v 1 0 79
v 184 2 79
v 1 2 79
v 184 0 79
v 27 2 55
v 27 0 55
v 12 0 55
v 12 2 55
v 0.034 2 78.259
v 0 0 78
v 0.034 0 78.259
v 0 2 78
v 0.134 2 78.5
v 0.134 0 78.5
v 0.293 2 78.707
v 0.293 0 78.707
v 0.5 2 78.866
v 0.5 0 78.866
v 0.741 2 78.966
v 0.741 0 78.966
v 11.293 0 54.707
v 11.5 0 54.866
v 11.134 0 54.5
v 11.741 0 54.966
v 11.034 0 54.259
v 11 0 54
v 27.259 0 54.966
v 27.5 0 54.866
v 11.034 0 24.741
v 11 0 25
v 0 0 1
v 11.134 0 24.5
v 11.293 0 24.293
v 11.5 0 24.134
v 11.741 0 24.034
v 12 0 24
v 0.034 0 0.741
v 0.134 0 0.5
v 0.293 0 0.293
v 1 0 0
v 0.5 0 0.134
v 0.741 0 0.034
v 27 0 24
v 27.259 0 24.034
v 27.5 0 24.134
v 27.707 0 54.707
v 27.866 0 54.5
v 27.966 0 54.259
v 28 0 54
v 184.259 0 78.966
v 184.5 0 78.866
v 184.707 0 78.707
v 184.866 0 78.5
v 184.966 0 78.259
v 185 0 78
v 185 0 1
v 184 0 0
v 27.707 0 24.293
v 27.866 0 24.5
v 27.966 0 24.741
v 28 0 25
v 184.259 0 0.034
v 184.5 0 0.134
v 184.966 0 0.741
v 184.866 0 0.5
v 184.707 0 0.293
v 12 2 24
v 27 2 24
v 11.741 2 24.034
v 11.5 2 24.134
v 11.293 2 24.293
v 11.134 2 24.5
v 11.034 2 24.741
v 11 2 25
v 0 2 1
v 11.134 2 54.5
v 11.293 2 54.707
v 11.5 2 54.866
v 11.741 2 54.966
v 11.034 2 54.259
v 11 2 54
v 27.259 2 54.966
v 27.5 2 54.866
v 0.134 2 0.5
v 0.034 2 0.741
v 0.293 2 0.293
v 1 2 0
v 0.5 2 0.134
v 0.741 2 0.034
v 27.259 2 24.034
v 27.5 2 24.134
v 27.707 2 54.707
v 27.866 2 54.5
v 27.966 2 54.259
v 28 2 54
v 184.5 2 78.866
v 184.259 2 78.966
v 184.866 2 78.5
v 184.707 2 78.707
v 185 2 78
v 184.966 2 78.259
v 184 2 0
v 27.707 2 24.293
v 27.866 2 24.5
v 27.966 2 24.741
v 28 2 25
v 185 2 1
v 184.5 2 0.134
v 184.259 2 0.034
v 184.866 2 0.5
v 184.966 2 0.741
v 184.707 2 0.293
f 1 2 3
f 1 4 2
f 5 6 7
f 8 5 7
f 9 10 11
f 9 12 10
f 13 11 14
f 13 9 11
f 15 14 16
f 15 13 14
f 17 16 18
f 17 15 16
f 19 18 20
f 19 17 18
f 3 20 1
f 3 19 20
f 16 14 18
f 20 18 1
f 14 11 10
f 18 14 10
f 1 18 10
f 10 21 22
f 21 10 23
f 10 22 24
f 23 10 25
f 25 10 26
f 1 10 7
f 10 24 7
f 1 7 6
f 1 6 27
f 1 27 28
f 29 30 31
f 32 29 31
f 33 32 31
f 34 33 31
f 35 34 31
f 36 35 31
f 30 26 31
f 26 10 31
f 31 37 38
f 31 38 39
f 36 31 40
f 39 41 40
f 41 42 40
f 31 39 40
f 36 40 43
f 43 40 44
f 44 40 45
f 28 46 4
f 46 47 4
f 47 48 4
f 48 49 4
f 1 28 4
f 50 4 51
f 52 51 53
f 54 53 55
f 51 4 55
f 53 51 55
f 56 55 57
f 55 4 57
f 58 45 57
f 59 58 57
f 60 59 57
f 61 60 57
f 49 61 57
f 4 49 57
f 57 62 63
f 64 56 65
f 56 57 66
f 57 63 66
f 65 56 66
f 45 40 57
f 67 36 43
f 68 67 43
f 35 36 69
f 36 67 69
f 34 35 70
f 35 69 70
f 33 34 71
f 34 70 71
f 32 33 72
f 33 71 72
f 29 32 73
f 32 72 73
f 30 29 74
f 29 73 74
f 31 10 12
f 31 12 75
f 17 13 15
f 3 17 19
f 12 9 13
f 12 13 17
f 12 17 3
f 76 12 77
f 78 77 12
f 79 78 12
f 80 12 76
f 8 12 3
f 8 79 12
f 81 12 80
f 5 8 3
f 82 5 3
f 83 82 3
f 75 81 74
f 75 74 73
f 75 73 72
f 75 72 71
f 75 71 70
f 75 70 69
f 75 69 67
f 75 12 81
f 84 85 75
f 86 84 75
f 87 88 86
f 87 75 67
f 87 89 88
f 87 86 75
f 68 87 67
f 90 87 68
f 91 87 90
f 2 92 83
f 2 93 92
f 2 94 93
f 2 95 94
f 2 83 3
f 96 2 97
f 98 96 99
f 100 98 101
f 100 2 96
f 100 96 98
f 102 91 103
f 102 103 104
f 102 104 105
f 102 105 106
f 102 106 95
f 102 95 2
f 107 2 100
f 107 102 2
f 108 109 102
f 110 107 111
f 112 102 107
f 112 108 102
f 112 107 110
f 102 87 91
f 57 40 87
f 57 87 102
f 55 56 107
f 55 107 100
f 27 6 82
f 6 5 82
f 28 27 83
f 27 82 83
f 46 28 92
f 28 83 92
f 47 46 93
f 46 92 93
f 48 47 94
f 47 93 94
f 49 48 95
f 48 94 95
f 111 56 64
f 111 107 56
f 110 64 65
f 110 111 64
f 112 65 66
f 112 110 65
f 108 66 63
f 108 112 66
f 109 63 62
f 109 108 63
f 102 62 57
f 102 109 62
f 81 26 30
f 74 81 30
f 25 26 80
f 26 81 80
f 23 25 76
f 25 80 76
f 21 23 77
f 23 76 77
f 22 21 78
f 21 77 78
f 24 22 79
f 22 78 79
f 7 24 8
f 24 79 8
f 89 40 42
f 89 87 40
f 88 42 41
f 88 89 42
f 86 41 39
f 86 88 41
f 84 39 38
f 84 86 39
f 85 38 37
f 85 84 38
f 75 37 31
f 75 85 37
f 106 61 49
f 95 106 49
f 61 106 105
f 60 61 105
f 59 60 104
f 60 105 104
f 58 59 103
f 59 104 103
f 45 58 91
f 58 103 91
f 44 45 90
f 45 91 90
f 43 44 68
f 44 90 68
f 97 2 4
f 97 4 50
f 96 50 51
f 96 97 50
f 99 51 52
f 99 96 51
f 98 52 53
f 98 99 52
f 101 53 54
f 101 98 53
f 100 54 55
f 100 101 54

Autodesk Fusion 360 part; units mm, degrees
sketch "Sketch1" plane through (0, 0, 0) normal (0, 1, 0) x (1, 0, 0)
  line L0 (0, 0) -> (185, 0)
  line L1 (185, 0) -> (185, -79)
  line L2 (185, -79) -> (0, -79)
  line L3 (0, -79) -> (0, 0)
extrude "Extrude1" add sketch "Sketch1" along normal blind 2
sketch "Sketch2" plane through (0, 0, 0) normal (0, 1, 0) x (1, 0, 0)
  line L0 (11, -24) -> (28, -24)
  line L1 (28, -24) -> (28, -55)
  line L2 (28, -55) -> (11, -55)
  line L3 (11, -55) -> (11, -24)
extrude "Extrude2" cut sketch "Sketch2" along normal blind 5
fillet "Fillet1" radius 1 1 edges at (185, 1, 79)
fillet "Fillet2" radius 1 1 edges at (185, 1, 0)
fillet "Fillet3" radius 1 1 edges at (0, 1, 79)
fillet "Fillet4" radius 1 1 edges at (0, 1, 0)
fillet "Fillet5" radius 1 1 edges at (28, 1, 55)
fillet "Fillet6" radius 1 1 edges at (11, 1, 55)
fillet "Fillet7" radius 1 1 edges at (11, 1, 24)
fillet "Fillet8" radius 1 1 edges at (28, 1, 24)
